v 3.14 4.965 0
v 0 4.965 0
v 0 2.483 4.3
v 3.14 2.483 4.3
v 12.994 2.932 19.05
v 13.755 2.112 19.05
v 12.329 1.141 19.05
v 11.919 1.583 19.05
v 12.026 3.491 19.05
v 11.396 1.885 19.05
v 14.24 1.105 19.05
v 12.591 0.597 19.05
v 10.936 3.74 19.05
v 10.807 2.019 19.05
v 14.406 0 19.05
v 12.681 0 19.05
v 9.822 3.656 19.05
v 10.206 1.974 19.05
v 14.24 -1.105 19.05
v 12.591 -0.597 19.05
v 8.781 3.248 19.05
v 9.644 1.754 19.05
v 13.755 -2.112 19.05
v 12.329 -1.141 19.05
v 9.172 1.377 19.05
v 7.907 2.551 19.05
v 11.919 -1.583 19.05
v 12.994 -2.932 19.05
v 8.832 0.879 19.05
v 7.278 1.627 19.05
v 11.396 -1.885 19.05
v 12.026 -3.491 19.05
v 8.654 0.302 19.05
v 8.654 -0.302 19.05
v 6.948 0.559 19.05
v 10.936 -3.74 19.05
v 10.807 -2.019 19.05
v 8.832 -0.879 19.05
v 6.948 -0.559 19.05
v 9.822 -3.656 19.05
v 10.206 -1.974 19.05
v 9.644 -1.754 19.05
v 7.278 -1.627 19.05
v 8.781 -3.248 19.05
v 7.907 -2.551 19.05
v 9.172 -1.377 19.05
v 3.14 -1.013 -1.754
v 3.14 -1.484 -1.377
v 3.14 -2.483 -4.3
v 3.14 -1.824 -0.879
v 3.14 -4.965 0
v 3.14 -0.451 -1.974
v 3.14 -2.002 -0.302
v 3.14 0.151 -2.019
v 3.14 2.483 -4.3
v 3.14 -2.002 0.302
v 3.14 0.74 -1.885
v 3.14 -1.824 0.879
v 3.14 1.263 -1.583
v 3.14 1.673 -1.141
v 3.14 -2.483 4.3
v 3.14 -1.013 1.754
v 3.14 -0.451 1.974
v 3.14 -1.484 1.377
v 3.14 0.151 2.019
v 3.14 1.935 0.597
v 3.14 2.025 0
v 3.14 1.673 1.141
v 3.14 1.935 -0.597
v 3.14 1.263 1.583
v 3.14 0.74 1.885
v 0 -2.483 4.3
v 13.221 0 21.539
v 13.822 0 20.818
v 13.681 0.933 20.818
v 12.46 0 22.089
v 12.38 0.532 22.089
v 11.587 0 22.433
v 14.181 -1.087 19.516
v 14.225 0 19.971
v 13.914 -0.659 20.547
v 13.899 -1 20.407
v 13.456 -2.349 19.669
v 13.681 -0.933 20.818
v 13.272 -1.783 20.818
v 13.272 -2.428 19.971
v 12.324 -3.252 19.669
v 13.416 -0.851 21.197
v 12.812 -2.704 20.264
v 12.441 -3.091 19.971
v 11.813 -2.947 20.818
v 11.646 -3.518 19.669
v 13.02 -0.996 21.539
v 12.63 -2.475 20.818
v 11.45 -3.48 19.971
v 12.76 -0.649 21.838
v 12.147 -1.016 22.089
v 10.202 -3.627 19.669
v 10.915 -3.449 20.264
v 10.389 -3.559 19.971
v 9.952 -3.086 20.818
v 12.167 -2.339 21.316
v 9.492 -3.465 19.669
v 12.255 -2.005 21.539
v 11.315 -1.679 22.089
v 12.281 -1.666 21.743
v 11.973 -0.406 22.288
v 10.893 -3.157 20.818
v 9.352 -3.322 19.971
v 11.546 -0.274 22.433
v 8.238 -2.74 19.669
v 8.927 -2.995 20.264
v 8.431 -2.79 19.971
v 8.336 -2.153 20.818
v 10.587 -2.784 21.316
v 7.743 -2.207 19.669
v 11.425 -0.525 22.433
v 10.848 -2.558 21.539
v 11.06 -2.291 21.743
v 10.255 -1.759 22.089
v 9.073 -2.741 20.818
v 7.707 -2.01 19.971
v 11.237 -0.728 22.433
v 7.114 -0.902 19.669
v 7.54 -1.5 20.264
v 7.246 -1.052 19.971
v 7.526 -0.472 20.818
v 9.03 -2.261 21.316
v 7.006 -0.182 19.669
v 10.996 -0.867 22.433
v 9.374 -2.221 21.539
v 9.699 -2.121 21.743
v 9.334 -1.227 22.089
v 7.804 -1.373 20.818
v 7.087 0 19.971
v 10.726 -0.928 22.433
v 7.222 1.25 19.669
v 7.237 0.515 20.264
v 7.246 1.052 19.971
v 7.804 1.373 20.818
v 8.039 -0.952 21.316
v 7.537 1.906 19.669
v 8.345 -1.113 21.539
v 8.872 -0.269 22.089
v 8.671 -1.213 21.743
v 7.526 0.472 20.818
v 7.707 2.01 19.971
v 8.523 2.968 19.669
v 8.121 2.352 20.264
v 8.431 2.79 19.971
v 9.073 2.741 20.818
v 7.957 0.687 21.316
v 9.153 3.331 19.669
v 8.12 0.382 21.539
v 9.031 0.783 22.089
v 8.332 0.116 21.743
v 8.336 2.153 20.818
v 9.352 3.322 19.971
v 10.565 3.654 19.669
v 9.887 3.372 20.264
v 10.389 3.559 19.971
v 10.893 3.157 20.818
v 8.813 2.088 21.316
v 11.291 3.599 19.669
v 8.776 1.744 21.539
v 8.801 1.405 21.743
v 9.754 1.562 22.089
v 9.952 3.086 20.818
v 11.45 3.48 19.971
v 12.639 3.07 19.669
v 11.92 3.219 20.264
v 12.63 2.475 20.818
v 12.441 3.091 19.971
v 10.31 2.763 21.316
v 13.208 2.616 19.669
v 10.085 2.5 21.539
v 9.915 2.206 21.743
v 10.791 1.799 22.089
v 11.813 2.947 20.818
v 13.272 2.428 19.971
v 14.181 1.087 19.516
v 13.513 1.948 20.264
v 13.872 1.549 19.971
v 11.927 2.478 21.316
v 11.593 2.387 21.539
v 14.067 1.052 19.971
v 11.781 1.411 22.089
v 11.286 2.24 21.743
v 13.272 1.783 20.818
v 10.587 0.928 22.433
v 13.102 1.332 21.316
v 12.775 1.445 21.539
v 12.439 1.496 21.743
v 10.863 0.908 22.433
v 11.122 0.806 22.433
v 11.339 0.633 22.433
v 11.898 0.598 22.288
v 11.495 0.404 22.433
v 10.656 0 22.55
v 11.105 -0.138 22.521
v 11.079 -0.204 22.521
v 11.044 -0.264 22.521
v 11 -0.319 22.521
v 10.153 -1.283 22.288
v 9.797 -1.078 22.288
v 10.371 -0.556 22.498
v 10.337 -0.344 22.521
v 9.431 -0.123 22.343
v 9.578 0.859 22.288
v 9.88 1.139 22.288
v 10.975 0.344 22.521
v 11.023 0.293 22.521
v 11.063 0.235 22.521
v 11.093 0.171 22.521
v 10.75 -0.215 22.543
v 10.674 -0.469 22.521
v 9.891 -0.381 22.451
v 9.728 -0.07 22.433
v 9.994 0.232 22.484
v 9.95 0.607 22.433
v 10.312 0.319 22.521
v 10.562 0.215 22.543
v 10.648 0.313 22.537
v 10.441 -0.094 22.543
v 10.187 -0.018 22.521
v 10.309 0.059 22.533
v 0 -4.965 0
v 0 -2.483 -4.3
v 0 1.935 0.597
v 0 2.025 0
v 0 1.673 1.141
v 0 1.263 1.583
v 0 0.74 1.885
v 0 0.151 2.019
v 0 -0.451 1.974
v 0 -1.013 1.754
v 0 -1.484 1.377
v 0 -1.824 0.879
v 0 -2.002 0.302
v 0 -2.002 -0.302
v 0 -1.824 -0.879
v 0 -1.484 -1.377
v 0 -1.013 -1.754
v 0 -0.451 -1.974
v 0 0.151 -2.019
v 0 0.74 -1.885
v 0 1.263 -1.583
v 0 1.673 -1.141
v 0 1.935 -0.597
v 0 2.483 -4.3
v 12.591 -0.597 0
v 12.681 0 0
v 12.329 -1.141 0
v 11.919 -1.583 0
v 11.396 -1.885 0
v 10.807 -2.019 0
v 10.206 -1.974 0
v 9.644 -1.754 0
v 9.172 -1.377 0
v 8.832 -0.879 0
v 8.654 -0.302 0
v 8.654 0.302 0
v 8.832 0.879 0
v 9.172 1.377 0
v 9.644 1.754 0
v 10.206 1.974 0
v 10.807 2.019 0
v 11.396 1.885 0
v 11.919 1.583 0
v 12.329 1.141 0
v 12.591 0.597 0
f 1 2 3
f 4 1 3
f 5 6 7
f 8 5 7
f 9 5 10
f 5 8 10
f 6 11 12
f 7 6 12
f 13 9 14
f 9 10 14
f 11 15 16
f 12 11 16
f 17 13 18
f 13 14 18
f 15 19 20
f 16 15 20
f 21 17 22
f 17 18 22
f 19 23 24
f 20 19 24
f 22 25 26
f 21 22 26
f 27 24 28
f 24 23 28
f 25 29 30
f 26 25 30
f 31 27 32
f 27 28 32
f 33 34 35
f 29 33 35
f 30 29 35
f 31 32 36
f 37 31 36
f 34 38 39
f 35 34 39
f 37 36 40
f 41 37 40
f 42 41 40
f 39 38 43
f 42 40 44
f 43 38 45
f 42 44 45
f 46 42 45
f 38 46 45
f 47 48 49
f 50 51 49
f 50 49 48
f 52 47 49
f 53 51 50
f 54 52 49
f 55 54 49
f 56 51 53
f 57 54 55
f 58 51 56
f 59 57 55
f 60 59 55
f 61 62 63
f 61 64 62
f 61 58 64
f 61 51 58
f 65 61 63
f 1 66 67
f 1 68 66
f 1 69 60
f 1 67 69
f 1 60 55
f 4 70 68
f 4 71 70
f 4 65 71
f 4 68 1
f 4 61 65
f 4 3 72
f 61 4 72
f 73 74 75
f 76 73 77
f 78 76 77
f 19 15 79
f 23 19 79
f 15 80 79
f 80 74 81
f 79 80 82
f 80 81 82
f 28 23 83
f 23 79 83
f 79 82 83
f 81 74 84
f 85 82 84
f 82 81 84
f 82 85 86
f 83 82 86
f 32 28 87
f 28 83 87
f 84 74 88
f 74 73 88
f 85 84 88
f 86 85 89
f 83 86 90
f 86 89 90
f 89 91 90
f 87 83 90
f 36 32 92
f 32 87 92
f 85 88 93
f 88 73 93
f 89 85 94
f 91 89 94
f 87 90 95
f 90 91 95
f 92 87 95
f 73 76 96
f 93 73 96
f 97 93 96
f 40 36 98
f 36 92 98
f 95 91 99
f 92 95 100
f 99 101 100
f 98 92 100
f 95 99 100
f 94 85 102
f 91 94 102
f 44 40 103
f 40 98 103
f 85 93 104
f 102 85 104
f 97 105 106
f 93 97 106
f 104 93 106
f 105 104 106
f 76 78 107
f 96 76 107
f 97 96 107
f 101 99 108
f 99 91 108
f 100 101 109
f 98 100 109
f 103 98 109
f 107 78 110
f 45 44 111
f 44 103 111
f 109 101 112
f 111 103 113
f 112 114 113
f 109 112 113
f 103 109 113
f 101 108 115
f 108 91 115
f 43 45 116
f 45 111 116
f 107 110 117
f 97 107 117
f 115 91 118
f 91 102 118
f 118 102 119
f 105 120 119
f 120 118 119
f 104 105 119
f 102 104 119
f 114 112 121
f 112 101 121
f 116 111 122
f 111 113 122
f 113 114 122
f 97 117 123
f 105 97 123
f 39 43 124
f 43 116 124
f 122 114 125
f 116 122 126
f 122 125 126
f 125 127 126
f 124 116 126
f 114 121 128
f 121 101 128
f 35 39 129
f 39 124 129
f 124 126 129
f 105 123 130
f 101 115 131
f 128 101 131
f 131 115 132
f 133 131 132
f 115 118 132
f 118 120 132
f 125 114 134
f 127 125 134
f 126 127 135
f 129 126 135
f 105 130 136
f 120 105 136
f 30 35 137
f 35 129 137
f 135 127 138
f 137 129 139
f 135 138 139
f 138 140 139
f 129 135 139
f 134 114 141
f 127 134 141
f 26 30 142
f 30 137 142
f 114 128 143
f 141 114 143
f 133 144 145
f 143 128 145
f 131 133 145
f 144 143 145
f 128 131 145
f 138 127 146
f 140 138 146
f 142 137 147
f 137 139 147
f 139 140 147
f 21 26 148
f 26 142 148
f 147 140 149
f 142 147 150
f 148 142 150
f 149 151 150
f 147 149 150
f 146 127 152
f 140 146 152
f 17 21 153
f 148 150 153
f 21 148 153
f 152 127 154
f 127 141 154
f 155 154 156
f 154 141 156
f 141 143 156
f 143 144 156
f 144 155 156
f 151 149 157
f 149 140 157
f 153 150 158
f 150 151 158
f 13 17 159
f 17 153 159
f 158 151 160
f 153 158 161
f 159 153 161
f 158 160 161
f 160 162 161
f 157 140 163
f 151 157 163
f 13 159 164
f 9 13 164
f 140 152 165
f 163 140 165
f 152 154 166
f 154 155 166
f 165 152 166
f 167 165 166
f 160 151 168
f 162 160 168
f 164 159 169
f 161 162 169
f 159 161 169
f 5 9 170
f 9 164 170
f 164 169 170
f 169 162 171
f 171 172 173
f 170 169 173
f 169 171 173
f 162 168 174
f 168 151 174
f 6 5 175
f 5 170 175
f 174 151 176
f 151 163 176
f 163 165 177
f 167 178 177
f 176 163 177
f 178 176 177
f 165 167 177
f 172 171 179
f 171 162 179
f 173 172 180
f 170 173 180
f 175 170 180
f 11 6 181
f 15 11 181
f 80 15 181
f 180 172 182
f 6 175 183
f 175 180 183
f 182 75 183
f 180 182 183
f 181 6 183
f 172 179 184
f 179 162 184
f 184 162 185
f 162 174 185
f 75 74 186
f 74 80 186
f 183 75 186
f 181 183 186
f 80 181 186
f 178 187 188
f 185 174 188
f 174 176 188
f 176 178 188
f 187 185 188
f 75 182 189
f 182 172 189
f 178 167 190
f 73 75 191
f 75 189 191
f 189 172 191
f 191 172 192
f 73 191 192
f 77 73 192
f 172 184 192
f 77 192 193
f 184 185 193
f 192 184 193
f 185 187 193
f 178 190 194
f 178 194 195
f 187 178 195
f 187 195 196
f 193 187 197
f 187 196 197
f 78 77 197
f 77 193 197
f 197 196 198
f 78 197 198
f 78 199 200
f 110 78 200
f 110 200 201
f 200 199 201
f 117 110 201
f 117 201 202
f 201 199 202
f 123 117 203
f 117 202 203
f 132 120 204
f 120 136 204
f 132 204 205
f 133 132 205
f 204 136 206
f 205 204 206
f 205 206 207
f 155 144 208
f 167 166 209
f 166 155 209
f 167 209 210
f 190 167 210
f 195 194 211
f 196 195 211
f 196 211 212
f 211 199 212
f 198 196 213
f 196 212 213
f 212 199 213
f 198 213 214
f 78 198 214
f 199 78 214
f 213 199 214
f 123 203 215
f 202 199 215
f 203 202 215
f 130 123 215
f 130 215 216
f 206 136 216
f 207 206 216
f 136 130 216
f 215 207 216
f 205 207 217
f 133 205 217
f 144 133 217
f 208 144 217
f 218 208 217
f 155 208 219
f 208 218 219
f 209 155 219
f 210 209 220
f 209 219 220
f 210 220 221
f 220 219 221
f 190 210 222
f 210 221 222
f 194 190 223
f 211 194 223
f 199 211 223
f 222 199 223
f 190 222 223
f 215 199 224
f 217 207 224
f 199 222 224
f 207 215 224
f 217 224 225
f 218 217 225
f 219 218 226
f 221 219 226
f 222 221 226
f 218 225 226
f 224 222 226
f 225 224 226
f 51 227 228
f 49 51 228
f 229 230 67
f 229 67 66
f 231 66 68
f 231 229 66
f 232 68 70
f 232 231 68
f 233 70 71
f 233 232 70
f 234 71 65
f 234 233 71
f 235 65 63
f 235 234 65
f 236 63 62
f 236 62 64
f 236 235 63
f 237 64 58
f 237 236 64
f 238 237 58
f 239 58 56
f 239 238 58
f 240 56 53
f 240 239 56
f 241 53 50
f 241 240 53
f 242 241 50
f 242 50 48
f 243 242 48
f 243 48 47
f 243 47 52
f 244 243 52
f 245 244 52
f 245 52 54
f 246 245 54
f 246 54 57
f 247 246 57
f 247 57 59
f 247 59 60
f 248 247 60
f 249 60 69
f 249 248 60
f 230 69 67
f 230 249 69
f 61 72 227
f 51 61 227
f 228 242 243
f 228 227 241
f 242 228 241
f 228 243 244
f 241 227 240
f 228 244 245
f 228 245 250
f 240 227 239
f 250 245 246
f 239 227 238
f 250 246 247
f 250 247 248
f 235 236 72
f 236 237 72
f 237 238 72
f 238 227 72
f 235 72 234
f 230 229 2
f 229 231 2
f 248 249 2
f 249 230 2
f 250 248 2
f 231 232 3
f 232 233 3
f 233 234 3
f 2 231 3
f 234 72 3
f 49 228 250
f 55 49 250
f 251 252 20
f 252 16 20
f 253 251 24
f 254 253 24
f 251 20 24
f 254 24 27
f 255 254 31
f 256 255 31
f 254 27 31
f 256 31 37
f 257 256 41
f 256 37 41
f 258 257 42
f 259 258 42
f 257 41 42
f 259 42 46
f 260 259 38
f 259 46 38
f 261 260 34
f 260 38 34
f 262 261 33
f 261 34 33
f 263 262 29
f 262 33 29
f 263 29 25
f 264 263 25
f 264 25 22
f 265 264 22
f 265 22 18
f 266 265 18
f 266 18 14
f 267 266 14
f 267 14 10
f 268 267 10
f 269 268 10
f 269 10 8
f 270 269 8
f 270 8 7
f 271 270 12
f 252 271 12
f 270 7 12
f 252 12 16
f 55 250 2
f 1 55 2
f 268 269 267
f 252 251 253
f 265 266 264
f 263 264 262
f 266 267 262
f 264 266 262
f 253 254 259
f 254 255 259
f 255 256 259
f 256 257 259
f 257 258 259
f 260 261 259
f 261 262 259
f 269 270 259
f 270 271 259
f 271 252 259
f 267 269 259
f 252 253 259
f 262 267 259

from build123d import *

# Parameters (mm, degrees)
F0_R     = 2.025
F1_DEPTH = 3.14


with BuildPart() as f1:
    # F0 (on Right) → F1 (new body)
    with BuildSketch(Plane.YZ):
        Polygon((-2.482606, 4.3), (-4.965212, 0), (-2.482606, -4.3), (2.482606, -4.3), (4.965212, 0), (2.482606, 4.3), align=None)
        Circle(F0_R, mode=Mode.SUBTRACT)
    extrude(amount=F1_DEPTH)


with BuildPart() as f3:
    # F2 (on Front) → F3 (revolve)
    with BuildSketch(Plane.XZ):
        with BuildLine():
            Line((10.656146, 22.55), (10.656146, 0))
            Line((10.656146, 0), (12.681146, 0))
            Line((12.681146, 0), (12.681146, 19.05))
            Line((12.681146, 19.05), (14.406146, 19.05))
            ThreePointArc((14.406146, 19.05), (13.220932, 21.539056), (10.656146, 22.55))
        make_face()
    revolve(axis=Axis((10.656146, 0, 11.275), (0, 0, -1)))


solid = Compound([f1.part, f3.part])
